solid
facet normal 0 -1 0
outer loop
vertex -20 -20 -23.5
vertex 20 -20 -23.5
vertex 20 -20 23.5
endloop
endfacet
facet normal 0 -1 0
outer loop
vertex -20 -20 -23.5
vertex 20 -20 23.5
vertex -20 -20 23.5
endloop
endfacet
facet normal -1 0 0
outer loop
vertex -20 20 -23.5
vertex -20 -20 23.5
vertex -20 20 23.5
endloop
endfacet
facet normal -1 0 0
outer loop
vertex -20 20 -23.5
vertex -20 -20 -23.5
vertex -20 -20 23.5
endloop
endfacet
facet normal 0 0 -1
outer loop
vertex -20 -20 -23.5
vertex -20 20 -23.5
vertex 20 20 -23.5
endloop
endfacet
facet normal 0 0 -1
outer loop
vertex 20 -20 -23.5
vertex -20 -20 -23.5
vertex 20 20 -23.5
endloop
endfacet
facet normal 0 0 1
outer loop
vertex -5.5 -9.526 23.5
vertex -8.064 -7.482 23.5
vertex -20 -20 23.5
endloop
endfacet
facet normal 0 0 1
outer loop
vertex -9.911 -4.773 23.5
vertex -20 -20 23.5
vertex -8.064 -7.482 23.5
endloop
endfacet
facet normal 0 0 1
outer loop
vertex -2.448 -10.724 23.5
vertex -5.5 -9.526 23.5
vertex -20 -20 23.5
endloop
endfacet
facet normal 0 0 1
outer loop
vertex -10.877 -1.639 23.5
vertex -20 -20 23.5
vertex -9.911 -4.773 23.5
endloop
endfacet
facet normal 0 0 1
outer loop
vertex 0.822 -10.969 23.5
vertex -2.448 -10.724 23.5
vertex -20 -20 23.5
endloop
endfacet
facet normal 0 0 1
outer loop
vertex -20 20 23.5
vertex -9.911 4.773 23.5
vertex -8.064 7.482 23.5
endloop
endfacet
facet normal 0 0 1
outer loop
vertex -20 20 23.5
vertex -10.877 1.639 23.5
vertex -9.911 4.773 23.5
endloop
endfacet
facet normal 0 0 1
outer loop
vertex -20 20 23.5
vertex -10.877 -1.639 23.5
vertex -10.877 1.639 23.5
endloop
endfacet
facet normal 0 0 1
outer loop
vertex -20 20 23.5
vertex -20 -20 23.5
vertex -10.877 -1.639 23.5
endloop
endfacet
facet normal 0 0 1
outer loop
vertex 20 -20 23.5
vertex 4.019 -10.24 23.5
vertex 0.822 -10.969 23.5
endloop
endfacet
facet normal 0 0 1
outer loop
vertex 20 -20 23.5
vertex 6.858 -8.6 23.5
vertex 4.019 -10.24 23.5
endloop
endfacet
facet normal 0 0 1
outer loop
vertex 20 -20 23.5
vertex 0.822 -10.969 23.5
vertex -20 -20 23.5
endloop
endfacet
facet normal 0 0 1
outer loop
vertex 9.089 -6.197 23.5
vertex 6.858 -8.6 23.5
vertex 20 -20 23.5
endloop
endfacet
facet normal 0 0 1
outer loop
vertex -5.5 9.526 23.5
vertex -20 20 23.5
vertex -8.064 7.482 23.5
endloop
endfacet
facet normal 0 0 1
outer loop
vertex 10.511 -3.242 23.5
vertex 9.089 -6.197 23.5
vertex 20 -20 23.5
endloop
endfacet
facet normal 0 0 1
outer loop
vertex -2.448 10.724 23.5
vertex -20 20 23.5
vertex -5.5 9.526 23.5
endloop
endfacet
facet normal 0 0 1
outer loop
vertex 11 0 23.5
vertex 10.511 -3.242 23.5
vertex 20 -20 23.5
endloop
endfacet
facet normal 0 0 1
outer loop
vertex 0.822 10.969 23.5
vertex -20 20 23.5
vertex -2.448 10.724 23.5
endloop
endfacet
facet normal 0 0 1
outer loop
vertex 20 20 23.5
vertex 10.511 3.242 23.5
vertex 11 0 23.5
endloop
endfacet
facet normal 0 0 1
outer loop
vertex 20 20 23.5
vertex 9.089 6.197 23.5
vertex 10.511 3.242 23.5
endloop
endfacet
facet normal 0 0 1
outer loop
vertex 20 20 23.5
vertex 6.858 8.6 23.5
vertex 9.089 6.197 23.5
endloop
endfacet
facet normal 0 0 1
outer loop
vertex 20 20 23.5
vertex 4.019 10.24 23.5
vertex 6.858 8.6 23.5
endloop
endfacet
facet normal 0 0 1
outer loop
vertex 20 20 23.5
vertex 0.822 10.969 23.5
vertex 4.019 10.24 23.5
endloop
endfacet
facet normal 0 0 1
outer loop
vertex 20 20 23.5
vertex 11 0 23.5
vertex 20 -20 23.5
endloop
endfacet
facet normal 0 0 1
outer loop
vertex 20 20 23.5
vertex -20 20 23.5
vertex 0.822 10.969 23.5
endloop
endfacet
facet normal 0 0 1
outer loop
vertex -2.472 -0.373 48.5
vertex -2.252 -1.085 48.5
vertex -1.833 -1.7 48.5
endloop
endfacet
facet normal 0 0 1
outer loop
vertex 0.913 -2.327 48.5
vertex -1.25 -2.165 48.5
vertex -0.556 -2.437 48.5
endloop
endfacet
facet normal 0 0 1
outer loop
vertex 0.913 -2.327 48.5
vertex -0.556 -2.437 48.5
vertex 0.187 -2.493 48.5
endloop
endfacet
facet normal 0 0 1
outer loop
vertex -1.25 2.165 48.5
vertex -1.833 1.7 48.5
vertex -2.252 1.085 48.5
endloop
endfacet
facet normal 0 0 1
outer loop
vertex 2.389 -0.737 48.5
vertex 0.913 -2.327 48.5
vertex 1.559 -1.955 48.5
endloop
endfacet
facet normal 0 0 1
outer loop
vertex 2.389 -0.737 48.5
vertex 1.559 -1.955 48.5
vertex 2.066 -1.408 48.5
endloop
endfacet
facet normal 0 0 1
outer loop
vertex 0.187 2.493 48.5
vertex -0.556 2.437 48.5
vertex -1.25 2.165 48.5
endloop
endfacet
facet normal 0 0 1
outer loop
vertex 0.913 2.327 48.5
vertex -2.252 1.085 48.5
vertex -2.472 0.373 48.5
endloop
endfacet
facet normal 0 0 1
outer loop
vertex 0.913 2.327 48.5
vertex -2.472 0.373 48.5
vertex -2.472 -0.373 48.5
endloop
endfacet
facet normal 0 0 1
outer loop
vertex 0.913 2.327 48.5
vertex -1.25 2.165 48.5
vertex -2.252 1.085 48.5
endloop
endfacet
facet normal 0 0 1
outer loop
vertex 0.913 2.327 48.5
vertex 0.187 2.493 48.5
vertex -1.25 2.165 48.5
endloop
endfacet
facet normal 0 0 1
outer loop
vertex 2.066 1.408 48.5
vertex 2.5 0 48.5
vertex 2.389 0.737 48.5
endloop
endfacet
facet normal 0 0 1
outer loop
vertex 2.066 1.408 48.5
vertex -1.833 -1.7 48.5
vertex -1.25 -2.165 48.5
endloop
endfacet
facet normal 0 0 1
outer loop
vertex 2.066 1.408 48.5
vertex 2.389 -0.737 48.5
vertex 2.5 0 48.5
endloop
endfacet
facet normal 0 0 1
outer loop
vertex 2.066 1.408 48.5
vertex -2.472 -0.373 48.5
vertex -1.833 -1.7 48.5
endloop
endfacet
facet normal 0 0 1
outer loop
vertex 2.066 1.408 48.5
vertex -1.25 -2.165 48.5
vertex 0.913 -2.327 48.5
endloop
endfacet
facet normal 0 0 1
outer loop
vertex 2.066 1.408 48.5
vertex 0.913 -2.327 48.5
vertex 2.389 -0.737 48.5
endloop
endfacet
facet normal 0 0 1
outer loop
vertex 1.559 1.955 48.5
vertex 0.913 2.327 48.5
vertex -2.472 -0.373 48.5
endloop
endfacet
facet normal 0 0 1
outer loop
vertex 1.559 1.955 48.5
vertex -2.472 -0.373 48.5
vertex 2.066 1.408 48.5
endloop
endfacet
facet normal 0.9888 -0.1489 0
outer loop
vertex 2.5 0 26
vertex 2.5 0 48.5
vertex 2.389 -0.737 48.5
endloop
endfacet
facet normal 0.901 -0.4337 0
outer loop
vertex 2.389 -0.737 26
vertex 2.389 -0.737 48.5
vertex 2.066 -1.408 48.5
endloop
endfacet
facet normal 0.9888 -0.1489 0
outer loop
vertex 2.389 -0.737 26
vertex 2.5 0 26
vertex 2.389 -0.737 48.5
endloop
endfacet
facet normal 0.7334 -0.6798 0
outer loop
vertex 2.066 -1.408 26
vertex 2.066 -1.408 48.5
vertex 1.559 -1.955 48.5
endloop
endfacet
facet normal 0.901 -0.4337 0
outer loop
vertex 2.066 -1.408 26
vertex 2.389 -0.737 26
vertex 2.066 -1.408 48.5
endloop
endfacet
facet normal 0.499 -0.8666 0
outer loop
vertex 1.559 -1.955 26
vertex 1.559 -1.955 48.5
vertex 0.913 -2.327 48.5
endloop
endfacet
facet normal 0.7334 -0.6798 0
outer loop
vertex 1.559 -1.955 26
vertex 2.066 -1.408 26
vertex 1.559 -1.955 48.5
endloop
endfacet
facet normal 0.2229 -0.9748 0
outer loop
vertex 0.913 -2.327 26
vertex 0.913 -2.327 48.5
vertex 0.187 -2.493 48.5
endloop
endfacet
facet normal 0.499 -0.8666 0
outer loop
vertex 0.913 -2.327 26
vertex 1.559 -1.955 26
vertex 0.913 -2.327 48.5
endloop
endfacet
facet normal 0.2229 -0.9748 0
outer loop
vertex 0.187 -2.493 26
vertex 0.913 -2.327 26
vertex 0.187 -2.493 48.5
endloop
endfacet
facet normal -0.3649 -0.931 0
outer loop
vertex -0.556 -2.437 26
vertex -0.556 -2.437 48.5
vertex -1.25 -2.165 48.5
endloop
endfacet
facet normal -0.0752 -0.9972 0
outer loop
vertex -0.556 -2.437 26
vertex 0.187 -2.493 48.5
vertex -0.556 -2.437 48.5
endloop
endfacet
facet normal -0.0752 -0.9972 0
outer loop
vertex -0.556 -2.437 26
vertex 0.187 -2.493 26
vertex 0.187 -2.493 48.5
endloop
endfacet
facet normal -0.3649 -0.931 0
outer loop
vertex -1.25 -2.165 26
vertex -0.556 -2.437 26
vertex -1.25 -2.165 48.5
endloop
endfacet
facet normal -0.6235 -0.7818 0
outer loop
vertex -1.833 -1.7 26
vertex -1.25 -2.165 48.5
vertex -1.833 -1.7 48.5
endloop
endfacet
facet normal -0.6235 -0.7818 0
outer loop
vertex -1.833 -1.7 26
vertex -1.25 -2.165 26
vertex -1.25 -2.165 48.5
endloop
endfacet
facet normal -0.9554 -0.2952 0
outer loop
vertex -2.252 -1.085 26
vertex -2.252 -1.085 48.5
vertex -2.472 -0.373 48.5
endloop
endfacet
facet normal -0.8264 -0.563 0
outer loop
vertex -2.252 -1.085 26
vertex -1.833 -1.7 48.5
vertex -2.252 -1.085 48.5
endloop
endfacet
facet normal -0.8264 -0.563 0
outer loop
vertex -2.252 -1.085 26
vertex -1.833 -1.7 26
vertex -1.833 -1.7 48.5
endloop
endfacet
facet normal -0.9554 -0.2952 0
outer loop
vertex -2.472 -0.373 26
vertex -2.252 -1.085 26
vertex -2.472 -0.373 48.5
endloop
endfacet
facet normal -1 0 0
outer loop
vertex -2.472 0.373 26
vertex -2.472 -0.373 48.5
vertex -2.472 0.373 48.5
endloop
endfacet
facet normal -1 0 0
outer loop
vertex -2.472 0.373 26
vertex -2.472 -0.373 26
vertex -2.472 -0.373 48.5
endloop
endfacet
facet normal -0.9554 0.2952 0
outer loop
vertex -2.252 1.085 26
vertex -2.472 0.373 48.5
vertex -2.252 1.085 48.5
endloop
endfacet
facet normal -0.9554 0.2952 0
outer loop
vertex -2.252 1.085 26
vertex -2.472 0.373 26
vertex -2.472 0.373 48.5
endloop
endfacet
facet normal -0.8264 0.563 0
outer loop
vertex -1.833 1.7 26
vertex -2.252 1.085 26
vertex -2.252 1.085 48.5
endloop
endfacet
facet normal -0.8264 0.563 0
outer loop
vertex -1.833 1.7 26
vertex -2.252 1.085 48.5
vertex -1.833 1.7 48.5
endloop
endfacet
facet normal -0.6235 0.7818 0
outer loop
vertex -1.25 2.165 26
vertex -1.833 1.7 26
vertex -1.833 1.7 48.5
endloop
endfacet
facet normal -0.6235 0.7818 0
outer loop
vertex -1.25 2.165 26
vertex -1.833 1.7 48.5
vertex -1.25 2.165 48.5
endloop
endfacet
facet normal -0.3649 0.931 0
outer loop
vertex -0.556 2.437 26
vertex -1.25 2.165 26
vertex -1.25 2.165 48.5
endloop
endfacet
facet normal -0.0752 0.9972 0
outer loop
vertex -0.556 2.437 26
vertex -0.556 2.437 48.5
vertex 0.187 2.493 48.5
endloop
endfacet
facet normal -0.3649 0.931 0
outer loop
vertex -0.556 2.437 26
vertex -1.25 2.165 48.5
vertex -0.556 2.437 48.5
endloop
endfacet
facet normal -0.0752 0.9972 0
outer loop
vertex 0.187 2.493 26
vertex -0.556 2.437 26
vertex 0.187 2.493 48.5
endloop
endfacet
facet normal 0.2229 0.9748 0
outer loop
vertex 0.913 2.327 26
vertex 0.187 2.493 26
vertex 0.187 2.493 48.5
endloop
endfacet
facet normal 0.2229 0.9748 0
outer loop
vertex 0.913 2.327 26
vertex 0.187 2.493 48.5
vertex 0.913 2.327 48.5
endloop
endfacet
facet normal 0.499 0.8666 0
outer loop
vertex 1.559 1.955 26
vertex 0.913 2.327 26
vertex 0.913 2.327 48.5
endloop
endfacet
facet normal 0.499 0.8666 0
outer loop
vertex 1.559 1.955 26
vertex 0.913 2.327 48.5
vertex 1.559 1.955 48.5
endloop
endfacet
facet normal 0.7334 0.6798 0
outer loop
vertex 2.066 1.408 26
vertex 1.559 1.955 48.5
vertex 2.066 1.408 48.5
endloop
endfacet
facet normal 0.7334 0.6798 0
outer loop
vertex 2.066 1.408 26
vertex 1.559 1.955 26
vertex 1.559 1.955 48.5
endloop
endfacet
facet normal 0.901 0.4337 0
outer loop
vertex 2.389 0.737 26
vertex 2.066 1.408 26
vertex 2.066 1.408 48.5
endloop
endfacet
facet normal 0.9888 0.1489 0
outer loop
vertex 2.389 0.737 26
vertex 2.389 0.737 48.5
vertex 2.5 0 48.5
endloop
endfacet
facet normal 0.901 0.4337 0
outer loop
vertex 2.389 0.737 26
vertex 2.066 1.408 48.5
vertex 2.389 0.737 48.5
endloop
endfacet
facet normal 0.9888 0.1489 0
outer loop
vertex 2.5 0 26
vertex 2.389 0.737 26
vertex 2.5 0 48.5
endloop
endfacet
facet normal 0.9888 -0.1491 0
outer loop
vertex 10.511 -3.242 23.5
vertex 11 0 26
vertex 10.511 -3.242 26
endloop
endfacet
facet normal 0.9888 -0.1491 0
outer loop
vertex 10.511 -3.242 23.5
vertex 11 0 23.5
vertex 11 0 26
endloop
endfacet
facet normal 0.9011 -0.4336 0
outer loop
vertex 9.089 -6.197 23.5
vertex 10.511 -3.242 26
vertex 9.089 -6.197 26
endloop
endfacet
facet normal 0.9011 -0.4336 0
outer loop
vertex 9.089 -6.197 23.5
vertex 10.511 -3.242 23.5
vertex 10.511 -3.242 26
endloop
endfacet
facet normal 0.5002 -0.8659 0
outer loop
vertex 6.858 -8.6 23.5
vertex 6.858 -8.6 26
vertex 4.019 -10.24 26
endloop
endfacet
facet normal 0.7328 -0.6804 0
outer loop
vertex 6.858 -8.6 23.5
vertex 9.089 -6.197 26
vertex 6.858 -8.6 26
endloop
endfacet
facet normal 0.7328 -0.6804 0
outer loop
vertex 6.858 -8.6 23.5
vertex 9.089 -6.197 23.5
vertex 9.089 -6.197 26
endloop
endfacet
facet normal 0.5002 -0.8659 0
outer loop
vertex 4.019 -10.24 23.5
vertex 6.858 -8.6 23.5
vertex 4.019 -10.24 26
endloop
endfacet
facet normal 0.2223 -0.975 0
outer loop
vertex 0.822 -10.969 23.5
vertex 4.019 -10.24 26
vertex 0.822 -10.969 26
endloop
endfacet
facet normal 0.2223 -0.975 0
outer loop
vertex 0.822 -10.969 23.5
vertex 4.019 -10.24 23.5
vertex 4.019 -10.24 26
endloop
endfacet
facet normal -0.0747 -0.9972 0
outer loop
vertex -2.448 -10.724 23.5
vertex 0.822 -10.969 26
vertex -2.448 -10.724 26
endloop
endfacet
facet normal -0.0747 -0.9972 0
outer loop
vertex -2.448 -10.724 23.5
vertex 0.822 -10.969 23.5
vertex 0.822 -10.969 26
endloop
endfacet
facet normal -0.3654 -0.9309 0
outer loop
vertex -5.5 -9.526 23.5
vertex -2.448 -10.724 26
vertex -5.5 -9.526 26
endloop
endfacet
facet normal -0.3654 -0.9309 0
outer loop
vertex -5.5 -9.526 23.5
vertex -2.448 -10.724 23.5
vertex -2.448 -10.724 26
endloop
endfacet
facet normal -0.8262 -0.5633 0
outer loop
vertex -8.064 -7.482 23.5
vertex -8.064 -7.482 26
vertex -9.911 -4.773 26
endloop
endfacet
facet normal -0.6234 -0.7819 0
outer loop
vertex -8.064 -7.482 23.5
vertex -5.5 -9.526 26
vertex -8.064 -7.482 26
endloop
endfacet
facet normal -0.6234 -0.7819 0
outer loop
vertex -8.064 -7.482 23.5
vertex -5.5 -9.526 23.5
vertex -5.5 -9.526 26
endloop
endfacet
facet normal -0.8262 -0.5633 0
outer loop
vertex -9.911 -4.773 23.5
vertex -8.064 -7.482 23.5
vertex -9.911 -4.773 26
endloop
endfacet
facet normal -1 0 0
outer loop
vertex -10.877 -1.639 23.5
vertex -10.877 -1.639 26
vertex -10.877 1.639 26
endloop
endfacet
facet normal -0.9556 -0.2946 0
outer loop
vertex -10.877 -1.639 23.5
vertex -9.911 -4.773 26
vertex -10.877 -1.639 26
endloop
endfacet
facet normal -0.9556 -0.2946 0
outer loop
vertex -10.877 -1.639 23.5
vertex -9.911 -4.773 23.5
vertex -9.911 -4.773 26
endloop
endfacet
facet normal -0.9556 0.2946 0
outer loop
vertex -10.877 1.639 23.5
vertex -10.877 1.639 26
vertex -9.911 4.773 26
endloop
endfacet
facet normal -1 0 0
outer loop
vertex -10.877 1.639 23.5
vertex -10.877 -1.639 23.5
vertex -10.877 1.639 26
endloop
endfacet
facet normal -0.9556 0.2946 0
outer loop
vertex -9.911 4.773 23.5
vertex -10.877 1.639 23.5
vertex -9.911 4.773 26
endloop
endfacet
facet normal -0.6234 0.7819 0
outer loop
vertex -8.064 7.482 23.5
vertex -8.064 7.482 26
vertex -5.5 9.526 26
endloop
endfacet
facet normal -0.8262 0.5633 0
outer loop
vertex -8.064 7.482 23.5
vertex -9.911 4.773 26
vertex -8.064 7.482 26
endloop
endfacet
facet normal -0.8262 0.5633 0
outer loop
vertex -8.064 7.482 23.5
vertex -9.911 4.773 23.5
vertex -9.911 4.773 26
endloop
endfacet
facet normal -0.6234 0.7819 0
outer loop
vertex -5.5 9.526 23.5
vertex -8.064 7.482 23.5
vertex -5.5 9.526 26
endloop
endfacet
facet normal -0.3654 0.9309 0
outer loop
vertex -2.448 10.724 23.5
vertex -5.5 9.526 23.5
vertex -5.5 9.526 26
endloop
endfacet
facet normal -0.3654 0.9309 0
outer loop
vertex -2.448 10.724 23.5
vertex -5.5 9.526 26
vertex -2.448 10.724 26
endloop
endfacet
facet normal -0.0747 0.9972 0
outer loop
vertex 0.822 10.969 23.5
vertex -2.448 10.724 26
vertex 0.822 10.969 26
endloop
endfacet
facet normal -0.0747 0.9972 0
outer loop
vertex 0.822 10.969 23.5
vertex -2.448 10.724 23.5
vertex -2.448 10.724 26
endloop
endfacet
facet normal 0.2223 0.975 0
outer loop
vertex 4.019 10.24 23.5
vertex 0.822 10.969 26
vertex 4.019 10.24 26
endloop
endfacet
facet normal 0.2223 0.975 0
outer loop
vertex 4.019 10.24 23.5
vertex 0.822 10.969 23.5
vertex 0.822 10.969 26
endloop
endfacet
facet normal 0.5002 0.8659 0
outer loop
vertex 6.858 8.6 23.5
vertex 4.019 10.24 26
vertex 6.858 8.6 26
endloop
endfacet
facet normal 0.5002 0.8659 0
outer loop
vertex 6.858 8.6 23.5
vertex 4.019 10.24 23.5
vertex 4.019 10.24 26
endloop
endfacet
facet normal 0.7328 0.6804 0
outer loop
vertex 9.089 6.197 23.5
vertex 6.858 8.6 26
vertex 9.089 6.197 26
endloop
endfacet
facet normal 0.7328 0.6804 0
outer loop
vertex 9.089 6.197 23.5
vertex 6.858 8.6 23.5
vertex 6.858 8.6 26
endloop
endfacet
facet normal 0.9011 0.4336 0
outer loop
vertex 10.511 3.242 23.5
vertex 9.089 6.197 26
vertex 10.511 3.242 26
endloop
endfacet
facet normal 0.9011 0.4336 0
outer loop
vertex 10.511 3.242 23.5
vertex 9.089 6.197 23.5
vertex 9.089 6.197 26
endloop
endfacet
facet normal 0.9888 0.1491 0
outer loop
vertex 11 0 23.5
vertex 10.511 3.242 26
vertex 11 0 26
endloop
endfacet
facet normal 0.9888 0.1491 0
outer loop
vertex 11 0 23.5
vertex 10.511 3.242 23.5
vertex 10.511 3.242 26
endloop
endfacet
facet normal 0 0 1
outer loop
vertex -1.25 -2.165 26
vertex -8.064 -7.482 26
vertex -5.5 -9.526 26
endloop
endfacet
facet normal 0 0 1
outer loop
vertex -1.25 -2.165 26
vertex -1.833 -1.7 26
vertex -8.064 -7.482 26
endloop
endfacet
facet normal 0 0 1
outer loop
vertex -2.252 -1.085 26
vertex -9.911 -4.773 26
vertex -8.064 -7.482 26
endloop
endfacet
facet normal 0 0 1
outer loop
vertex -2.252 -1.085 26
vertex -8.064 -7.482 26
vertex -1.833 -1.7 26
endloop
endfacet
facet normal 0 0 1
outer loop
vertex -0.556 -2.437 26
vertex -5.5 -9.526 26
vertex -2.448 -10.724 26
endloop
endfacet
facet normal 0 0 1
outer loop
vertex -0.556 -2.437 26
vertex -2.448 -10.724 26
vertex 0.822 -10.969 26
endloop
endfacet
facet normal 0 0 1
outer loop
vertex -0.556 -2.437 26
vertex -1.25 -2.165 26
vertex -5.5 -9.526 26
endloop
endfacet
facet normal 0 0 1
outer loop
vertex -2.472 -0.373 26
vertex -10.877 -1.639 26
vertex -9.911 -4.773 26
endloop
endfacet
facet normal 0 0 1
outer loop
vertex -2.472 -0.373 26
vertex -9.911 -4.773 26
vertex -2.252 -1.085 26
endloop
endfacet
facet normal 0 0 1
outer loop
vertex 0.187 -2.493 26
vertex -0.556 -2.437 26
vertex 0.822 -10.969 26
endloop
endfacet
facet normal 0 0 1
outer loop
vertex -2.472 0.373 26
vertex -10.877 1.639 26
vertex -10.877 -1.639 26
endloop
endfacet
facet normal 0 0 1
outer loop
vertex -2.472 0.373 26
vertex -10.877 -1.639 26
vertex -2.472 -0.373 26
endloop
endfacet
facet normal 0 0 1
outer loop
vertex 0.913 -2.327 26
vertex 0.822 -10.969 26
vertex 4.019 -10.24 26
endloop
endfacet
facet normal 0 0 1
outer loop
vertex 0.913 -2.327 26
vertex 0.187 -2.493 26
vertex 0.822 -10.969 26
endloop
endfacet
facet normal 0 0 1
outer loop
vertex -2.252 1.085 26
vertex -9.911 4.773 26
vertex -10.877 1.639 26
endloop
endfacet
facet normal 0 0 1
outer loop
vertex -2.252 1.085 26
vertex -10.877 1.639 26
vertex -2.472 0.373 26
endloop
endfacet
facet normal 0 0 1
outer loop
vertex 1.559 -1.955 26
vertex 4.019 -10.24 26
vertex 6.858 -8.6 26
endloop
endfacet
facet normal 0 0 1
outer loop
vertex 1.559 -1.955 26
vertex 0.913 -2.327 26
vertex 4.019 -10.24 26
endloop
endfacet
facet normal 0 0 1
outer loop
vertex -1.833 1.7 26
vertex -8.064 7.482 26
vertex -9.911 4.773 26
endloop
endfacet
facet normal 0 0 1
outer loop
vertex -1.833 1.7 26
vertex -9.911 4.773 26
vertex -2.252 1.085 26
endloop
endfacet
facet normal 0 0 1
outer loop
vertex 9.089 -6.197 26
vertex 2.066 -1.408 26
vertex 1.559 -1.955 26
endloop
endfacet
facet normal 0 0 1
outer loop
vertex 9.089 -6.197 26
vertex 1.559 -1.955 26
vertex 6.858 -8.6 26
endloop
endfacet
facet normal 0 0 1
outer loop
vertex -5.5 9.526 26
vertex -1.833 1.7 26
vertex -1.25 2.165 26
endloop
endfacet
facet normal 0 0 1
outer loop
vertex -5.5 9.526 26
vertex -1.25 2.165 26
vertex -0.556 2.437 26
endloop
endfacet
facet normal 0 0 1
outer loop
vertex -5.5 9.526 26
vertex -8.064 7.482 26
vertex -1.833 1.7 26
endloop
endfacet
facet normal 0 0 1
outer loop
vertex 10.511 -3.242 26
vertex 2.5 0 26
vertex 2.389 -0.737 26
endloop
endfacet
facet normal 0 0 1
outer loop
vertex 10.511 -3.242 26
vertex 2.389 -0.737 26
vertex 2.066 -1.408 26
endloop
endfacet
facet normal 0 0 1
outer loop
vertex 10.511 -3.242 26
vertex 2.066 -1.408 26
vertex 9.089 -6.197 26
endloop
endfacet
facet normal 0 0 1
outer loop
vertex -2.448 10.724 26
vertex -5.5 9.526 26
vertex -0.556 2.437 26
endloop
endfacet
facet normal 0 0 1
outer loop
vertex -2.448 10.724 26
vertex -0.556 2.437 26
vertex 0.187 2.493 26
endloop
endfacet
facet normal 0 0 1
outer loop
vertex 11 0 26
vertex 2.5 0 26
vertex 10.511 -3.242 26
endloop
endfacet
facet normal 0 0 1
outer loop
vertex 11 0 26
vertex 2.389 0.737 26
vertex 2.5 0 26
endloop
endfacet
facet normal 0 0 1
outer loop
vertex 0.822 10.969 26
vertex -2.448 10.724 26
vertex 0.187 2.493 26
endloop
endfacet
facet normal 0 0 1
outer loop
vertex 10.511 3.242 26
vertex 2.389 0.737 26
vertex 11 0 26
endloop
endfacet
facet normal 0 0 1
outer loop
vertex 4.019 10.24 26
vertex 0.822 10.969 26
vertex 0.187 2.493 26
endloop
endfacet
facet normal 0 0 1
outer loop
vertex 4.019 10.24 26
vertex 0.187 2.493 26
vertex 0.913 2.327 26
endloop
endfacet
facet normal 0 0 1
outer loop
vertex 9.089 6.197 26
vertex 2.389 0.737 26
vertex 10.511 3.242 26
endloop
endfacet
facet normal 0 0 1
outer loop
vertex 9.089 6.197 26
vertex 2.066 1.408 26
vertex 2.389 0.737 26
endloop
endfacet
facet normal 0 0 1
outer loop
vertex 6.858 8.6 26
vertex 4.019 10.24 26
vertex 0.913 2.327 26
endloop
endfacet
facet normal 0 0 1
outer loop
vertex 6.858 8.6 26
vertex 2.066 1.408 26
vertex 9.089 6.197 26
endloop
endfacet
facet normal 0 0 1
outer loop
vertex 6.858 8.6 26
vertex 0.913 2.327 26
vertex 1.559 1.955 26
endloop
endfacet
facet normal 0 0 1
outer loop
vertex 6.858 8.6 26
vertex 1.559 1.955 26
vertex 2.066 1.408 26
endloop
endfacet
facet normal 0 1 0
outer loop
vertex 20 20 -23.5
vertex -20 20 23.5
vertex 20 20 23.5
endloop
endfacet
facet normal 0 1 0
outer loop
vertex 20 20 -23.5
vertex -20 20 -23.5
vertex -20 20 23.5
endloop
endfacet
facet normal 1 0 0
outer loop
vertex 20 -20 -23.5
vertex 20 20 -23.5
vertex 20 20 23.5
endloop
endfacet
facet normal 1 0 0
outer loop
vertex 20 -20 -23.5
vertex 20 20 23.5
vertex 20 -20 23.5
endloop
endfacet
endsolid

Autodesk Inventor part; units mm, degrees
ref_plane "YZ Plane" through (0, 0, 0) normal (1, 0, 0) x (0, 1, 0)
ref_plane "XZ Plane" through (0, 0, 0) normal (0, 1, 0) x (-1, 0, 0)
ref_plane "XY Plane" through (0, 0, 0) normal (0, 0, 1) x (1, 0, 0)
sketch "Sketch1" plane through (0, 0, 0) normal (0, 0, 1) x (1, 0, 0)
  line L0 (-20, 20) -> (20, 20)
  line L1 (20, 20) -> (20, -20)
  line L2 (20, -20) -> (-20, -20)
  line L3 (-20, -20) -> (-20, 20)
  line L4 (-20, 20) -> (20, -20) construction
  line L5 (20, 20) -> (-20, -20) construction
  point P0 (0, 0)
  dimension "d0" = 40
  dimension "d1" = 40
extrude "Extrusion1" add sketch "Sketch1" along normal mid plane 47
sketch "Sketch2" plane through (0, 0, 23.5) normal (0, 0, 1) x (1, 0, 0)
  circle A0 centre (0, 0) radius 2.5
  dimension "d4" = 5
extrude "Extrusion2" add sketch "Sketch2" along normal blind 25
sketch "Sketch3" plane through (0, 0, 23.5) normal (0, 0, 1) x (1, 0, 0)
  circle A0 centre (0, 0) radius 11
  dimension "d7" = 22
extrude "Extrusion3" add sketch "Sketch3" along normal blind 2.5
properties part number "NEMA 17 PARA TAPA PRINCIPAL"
